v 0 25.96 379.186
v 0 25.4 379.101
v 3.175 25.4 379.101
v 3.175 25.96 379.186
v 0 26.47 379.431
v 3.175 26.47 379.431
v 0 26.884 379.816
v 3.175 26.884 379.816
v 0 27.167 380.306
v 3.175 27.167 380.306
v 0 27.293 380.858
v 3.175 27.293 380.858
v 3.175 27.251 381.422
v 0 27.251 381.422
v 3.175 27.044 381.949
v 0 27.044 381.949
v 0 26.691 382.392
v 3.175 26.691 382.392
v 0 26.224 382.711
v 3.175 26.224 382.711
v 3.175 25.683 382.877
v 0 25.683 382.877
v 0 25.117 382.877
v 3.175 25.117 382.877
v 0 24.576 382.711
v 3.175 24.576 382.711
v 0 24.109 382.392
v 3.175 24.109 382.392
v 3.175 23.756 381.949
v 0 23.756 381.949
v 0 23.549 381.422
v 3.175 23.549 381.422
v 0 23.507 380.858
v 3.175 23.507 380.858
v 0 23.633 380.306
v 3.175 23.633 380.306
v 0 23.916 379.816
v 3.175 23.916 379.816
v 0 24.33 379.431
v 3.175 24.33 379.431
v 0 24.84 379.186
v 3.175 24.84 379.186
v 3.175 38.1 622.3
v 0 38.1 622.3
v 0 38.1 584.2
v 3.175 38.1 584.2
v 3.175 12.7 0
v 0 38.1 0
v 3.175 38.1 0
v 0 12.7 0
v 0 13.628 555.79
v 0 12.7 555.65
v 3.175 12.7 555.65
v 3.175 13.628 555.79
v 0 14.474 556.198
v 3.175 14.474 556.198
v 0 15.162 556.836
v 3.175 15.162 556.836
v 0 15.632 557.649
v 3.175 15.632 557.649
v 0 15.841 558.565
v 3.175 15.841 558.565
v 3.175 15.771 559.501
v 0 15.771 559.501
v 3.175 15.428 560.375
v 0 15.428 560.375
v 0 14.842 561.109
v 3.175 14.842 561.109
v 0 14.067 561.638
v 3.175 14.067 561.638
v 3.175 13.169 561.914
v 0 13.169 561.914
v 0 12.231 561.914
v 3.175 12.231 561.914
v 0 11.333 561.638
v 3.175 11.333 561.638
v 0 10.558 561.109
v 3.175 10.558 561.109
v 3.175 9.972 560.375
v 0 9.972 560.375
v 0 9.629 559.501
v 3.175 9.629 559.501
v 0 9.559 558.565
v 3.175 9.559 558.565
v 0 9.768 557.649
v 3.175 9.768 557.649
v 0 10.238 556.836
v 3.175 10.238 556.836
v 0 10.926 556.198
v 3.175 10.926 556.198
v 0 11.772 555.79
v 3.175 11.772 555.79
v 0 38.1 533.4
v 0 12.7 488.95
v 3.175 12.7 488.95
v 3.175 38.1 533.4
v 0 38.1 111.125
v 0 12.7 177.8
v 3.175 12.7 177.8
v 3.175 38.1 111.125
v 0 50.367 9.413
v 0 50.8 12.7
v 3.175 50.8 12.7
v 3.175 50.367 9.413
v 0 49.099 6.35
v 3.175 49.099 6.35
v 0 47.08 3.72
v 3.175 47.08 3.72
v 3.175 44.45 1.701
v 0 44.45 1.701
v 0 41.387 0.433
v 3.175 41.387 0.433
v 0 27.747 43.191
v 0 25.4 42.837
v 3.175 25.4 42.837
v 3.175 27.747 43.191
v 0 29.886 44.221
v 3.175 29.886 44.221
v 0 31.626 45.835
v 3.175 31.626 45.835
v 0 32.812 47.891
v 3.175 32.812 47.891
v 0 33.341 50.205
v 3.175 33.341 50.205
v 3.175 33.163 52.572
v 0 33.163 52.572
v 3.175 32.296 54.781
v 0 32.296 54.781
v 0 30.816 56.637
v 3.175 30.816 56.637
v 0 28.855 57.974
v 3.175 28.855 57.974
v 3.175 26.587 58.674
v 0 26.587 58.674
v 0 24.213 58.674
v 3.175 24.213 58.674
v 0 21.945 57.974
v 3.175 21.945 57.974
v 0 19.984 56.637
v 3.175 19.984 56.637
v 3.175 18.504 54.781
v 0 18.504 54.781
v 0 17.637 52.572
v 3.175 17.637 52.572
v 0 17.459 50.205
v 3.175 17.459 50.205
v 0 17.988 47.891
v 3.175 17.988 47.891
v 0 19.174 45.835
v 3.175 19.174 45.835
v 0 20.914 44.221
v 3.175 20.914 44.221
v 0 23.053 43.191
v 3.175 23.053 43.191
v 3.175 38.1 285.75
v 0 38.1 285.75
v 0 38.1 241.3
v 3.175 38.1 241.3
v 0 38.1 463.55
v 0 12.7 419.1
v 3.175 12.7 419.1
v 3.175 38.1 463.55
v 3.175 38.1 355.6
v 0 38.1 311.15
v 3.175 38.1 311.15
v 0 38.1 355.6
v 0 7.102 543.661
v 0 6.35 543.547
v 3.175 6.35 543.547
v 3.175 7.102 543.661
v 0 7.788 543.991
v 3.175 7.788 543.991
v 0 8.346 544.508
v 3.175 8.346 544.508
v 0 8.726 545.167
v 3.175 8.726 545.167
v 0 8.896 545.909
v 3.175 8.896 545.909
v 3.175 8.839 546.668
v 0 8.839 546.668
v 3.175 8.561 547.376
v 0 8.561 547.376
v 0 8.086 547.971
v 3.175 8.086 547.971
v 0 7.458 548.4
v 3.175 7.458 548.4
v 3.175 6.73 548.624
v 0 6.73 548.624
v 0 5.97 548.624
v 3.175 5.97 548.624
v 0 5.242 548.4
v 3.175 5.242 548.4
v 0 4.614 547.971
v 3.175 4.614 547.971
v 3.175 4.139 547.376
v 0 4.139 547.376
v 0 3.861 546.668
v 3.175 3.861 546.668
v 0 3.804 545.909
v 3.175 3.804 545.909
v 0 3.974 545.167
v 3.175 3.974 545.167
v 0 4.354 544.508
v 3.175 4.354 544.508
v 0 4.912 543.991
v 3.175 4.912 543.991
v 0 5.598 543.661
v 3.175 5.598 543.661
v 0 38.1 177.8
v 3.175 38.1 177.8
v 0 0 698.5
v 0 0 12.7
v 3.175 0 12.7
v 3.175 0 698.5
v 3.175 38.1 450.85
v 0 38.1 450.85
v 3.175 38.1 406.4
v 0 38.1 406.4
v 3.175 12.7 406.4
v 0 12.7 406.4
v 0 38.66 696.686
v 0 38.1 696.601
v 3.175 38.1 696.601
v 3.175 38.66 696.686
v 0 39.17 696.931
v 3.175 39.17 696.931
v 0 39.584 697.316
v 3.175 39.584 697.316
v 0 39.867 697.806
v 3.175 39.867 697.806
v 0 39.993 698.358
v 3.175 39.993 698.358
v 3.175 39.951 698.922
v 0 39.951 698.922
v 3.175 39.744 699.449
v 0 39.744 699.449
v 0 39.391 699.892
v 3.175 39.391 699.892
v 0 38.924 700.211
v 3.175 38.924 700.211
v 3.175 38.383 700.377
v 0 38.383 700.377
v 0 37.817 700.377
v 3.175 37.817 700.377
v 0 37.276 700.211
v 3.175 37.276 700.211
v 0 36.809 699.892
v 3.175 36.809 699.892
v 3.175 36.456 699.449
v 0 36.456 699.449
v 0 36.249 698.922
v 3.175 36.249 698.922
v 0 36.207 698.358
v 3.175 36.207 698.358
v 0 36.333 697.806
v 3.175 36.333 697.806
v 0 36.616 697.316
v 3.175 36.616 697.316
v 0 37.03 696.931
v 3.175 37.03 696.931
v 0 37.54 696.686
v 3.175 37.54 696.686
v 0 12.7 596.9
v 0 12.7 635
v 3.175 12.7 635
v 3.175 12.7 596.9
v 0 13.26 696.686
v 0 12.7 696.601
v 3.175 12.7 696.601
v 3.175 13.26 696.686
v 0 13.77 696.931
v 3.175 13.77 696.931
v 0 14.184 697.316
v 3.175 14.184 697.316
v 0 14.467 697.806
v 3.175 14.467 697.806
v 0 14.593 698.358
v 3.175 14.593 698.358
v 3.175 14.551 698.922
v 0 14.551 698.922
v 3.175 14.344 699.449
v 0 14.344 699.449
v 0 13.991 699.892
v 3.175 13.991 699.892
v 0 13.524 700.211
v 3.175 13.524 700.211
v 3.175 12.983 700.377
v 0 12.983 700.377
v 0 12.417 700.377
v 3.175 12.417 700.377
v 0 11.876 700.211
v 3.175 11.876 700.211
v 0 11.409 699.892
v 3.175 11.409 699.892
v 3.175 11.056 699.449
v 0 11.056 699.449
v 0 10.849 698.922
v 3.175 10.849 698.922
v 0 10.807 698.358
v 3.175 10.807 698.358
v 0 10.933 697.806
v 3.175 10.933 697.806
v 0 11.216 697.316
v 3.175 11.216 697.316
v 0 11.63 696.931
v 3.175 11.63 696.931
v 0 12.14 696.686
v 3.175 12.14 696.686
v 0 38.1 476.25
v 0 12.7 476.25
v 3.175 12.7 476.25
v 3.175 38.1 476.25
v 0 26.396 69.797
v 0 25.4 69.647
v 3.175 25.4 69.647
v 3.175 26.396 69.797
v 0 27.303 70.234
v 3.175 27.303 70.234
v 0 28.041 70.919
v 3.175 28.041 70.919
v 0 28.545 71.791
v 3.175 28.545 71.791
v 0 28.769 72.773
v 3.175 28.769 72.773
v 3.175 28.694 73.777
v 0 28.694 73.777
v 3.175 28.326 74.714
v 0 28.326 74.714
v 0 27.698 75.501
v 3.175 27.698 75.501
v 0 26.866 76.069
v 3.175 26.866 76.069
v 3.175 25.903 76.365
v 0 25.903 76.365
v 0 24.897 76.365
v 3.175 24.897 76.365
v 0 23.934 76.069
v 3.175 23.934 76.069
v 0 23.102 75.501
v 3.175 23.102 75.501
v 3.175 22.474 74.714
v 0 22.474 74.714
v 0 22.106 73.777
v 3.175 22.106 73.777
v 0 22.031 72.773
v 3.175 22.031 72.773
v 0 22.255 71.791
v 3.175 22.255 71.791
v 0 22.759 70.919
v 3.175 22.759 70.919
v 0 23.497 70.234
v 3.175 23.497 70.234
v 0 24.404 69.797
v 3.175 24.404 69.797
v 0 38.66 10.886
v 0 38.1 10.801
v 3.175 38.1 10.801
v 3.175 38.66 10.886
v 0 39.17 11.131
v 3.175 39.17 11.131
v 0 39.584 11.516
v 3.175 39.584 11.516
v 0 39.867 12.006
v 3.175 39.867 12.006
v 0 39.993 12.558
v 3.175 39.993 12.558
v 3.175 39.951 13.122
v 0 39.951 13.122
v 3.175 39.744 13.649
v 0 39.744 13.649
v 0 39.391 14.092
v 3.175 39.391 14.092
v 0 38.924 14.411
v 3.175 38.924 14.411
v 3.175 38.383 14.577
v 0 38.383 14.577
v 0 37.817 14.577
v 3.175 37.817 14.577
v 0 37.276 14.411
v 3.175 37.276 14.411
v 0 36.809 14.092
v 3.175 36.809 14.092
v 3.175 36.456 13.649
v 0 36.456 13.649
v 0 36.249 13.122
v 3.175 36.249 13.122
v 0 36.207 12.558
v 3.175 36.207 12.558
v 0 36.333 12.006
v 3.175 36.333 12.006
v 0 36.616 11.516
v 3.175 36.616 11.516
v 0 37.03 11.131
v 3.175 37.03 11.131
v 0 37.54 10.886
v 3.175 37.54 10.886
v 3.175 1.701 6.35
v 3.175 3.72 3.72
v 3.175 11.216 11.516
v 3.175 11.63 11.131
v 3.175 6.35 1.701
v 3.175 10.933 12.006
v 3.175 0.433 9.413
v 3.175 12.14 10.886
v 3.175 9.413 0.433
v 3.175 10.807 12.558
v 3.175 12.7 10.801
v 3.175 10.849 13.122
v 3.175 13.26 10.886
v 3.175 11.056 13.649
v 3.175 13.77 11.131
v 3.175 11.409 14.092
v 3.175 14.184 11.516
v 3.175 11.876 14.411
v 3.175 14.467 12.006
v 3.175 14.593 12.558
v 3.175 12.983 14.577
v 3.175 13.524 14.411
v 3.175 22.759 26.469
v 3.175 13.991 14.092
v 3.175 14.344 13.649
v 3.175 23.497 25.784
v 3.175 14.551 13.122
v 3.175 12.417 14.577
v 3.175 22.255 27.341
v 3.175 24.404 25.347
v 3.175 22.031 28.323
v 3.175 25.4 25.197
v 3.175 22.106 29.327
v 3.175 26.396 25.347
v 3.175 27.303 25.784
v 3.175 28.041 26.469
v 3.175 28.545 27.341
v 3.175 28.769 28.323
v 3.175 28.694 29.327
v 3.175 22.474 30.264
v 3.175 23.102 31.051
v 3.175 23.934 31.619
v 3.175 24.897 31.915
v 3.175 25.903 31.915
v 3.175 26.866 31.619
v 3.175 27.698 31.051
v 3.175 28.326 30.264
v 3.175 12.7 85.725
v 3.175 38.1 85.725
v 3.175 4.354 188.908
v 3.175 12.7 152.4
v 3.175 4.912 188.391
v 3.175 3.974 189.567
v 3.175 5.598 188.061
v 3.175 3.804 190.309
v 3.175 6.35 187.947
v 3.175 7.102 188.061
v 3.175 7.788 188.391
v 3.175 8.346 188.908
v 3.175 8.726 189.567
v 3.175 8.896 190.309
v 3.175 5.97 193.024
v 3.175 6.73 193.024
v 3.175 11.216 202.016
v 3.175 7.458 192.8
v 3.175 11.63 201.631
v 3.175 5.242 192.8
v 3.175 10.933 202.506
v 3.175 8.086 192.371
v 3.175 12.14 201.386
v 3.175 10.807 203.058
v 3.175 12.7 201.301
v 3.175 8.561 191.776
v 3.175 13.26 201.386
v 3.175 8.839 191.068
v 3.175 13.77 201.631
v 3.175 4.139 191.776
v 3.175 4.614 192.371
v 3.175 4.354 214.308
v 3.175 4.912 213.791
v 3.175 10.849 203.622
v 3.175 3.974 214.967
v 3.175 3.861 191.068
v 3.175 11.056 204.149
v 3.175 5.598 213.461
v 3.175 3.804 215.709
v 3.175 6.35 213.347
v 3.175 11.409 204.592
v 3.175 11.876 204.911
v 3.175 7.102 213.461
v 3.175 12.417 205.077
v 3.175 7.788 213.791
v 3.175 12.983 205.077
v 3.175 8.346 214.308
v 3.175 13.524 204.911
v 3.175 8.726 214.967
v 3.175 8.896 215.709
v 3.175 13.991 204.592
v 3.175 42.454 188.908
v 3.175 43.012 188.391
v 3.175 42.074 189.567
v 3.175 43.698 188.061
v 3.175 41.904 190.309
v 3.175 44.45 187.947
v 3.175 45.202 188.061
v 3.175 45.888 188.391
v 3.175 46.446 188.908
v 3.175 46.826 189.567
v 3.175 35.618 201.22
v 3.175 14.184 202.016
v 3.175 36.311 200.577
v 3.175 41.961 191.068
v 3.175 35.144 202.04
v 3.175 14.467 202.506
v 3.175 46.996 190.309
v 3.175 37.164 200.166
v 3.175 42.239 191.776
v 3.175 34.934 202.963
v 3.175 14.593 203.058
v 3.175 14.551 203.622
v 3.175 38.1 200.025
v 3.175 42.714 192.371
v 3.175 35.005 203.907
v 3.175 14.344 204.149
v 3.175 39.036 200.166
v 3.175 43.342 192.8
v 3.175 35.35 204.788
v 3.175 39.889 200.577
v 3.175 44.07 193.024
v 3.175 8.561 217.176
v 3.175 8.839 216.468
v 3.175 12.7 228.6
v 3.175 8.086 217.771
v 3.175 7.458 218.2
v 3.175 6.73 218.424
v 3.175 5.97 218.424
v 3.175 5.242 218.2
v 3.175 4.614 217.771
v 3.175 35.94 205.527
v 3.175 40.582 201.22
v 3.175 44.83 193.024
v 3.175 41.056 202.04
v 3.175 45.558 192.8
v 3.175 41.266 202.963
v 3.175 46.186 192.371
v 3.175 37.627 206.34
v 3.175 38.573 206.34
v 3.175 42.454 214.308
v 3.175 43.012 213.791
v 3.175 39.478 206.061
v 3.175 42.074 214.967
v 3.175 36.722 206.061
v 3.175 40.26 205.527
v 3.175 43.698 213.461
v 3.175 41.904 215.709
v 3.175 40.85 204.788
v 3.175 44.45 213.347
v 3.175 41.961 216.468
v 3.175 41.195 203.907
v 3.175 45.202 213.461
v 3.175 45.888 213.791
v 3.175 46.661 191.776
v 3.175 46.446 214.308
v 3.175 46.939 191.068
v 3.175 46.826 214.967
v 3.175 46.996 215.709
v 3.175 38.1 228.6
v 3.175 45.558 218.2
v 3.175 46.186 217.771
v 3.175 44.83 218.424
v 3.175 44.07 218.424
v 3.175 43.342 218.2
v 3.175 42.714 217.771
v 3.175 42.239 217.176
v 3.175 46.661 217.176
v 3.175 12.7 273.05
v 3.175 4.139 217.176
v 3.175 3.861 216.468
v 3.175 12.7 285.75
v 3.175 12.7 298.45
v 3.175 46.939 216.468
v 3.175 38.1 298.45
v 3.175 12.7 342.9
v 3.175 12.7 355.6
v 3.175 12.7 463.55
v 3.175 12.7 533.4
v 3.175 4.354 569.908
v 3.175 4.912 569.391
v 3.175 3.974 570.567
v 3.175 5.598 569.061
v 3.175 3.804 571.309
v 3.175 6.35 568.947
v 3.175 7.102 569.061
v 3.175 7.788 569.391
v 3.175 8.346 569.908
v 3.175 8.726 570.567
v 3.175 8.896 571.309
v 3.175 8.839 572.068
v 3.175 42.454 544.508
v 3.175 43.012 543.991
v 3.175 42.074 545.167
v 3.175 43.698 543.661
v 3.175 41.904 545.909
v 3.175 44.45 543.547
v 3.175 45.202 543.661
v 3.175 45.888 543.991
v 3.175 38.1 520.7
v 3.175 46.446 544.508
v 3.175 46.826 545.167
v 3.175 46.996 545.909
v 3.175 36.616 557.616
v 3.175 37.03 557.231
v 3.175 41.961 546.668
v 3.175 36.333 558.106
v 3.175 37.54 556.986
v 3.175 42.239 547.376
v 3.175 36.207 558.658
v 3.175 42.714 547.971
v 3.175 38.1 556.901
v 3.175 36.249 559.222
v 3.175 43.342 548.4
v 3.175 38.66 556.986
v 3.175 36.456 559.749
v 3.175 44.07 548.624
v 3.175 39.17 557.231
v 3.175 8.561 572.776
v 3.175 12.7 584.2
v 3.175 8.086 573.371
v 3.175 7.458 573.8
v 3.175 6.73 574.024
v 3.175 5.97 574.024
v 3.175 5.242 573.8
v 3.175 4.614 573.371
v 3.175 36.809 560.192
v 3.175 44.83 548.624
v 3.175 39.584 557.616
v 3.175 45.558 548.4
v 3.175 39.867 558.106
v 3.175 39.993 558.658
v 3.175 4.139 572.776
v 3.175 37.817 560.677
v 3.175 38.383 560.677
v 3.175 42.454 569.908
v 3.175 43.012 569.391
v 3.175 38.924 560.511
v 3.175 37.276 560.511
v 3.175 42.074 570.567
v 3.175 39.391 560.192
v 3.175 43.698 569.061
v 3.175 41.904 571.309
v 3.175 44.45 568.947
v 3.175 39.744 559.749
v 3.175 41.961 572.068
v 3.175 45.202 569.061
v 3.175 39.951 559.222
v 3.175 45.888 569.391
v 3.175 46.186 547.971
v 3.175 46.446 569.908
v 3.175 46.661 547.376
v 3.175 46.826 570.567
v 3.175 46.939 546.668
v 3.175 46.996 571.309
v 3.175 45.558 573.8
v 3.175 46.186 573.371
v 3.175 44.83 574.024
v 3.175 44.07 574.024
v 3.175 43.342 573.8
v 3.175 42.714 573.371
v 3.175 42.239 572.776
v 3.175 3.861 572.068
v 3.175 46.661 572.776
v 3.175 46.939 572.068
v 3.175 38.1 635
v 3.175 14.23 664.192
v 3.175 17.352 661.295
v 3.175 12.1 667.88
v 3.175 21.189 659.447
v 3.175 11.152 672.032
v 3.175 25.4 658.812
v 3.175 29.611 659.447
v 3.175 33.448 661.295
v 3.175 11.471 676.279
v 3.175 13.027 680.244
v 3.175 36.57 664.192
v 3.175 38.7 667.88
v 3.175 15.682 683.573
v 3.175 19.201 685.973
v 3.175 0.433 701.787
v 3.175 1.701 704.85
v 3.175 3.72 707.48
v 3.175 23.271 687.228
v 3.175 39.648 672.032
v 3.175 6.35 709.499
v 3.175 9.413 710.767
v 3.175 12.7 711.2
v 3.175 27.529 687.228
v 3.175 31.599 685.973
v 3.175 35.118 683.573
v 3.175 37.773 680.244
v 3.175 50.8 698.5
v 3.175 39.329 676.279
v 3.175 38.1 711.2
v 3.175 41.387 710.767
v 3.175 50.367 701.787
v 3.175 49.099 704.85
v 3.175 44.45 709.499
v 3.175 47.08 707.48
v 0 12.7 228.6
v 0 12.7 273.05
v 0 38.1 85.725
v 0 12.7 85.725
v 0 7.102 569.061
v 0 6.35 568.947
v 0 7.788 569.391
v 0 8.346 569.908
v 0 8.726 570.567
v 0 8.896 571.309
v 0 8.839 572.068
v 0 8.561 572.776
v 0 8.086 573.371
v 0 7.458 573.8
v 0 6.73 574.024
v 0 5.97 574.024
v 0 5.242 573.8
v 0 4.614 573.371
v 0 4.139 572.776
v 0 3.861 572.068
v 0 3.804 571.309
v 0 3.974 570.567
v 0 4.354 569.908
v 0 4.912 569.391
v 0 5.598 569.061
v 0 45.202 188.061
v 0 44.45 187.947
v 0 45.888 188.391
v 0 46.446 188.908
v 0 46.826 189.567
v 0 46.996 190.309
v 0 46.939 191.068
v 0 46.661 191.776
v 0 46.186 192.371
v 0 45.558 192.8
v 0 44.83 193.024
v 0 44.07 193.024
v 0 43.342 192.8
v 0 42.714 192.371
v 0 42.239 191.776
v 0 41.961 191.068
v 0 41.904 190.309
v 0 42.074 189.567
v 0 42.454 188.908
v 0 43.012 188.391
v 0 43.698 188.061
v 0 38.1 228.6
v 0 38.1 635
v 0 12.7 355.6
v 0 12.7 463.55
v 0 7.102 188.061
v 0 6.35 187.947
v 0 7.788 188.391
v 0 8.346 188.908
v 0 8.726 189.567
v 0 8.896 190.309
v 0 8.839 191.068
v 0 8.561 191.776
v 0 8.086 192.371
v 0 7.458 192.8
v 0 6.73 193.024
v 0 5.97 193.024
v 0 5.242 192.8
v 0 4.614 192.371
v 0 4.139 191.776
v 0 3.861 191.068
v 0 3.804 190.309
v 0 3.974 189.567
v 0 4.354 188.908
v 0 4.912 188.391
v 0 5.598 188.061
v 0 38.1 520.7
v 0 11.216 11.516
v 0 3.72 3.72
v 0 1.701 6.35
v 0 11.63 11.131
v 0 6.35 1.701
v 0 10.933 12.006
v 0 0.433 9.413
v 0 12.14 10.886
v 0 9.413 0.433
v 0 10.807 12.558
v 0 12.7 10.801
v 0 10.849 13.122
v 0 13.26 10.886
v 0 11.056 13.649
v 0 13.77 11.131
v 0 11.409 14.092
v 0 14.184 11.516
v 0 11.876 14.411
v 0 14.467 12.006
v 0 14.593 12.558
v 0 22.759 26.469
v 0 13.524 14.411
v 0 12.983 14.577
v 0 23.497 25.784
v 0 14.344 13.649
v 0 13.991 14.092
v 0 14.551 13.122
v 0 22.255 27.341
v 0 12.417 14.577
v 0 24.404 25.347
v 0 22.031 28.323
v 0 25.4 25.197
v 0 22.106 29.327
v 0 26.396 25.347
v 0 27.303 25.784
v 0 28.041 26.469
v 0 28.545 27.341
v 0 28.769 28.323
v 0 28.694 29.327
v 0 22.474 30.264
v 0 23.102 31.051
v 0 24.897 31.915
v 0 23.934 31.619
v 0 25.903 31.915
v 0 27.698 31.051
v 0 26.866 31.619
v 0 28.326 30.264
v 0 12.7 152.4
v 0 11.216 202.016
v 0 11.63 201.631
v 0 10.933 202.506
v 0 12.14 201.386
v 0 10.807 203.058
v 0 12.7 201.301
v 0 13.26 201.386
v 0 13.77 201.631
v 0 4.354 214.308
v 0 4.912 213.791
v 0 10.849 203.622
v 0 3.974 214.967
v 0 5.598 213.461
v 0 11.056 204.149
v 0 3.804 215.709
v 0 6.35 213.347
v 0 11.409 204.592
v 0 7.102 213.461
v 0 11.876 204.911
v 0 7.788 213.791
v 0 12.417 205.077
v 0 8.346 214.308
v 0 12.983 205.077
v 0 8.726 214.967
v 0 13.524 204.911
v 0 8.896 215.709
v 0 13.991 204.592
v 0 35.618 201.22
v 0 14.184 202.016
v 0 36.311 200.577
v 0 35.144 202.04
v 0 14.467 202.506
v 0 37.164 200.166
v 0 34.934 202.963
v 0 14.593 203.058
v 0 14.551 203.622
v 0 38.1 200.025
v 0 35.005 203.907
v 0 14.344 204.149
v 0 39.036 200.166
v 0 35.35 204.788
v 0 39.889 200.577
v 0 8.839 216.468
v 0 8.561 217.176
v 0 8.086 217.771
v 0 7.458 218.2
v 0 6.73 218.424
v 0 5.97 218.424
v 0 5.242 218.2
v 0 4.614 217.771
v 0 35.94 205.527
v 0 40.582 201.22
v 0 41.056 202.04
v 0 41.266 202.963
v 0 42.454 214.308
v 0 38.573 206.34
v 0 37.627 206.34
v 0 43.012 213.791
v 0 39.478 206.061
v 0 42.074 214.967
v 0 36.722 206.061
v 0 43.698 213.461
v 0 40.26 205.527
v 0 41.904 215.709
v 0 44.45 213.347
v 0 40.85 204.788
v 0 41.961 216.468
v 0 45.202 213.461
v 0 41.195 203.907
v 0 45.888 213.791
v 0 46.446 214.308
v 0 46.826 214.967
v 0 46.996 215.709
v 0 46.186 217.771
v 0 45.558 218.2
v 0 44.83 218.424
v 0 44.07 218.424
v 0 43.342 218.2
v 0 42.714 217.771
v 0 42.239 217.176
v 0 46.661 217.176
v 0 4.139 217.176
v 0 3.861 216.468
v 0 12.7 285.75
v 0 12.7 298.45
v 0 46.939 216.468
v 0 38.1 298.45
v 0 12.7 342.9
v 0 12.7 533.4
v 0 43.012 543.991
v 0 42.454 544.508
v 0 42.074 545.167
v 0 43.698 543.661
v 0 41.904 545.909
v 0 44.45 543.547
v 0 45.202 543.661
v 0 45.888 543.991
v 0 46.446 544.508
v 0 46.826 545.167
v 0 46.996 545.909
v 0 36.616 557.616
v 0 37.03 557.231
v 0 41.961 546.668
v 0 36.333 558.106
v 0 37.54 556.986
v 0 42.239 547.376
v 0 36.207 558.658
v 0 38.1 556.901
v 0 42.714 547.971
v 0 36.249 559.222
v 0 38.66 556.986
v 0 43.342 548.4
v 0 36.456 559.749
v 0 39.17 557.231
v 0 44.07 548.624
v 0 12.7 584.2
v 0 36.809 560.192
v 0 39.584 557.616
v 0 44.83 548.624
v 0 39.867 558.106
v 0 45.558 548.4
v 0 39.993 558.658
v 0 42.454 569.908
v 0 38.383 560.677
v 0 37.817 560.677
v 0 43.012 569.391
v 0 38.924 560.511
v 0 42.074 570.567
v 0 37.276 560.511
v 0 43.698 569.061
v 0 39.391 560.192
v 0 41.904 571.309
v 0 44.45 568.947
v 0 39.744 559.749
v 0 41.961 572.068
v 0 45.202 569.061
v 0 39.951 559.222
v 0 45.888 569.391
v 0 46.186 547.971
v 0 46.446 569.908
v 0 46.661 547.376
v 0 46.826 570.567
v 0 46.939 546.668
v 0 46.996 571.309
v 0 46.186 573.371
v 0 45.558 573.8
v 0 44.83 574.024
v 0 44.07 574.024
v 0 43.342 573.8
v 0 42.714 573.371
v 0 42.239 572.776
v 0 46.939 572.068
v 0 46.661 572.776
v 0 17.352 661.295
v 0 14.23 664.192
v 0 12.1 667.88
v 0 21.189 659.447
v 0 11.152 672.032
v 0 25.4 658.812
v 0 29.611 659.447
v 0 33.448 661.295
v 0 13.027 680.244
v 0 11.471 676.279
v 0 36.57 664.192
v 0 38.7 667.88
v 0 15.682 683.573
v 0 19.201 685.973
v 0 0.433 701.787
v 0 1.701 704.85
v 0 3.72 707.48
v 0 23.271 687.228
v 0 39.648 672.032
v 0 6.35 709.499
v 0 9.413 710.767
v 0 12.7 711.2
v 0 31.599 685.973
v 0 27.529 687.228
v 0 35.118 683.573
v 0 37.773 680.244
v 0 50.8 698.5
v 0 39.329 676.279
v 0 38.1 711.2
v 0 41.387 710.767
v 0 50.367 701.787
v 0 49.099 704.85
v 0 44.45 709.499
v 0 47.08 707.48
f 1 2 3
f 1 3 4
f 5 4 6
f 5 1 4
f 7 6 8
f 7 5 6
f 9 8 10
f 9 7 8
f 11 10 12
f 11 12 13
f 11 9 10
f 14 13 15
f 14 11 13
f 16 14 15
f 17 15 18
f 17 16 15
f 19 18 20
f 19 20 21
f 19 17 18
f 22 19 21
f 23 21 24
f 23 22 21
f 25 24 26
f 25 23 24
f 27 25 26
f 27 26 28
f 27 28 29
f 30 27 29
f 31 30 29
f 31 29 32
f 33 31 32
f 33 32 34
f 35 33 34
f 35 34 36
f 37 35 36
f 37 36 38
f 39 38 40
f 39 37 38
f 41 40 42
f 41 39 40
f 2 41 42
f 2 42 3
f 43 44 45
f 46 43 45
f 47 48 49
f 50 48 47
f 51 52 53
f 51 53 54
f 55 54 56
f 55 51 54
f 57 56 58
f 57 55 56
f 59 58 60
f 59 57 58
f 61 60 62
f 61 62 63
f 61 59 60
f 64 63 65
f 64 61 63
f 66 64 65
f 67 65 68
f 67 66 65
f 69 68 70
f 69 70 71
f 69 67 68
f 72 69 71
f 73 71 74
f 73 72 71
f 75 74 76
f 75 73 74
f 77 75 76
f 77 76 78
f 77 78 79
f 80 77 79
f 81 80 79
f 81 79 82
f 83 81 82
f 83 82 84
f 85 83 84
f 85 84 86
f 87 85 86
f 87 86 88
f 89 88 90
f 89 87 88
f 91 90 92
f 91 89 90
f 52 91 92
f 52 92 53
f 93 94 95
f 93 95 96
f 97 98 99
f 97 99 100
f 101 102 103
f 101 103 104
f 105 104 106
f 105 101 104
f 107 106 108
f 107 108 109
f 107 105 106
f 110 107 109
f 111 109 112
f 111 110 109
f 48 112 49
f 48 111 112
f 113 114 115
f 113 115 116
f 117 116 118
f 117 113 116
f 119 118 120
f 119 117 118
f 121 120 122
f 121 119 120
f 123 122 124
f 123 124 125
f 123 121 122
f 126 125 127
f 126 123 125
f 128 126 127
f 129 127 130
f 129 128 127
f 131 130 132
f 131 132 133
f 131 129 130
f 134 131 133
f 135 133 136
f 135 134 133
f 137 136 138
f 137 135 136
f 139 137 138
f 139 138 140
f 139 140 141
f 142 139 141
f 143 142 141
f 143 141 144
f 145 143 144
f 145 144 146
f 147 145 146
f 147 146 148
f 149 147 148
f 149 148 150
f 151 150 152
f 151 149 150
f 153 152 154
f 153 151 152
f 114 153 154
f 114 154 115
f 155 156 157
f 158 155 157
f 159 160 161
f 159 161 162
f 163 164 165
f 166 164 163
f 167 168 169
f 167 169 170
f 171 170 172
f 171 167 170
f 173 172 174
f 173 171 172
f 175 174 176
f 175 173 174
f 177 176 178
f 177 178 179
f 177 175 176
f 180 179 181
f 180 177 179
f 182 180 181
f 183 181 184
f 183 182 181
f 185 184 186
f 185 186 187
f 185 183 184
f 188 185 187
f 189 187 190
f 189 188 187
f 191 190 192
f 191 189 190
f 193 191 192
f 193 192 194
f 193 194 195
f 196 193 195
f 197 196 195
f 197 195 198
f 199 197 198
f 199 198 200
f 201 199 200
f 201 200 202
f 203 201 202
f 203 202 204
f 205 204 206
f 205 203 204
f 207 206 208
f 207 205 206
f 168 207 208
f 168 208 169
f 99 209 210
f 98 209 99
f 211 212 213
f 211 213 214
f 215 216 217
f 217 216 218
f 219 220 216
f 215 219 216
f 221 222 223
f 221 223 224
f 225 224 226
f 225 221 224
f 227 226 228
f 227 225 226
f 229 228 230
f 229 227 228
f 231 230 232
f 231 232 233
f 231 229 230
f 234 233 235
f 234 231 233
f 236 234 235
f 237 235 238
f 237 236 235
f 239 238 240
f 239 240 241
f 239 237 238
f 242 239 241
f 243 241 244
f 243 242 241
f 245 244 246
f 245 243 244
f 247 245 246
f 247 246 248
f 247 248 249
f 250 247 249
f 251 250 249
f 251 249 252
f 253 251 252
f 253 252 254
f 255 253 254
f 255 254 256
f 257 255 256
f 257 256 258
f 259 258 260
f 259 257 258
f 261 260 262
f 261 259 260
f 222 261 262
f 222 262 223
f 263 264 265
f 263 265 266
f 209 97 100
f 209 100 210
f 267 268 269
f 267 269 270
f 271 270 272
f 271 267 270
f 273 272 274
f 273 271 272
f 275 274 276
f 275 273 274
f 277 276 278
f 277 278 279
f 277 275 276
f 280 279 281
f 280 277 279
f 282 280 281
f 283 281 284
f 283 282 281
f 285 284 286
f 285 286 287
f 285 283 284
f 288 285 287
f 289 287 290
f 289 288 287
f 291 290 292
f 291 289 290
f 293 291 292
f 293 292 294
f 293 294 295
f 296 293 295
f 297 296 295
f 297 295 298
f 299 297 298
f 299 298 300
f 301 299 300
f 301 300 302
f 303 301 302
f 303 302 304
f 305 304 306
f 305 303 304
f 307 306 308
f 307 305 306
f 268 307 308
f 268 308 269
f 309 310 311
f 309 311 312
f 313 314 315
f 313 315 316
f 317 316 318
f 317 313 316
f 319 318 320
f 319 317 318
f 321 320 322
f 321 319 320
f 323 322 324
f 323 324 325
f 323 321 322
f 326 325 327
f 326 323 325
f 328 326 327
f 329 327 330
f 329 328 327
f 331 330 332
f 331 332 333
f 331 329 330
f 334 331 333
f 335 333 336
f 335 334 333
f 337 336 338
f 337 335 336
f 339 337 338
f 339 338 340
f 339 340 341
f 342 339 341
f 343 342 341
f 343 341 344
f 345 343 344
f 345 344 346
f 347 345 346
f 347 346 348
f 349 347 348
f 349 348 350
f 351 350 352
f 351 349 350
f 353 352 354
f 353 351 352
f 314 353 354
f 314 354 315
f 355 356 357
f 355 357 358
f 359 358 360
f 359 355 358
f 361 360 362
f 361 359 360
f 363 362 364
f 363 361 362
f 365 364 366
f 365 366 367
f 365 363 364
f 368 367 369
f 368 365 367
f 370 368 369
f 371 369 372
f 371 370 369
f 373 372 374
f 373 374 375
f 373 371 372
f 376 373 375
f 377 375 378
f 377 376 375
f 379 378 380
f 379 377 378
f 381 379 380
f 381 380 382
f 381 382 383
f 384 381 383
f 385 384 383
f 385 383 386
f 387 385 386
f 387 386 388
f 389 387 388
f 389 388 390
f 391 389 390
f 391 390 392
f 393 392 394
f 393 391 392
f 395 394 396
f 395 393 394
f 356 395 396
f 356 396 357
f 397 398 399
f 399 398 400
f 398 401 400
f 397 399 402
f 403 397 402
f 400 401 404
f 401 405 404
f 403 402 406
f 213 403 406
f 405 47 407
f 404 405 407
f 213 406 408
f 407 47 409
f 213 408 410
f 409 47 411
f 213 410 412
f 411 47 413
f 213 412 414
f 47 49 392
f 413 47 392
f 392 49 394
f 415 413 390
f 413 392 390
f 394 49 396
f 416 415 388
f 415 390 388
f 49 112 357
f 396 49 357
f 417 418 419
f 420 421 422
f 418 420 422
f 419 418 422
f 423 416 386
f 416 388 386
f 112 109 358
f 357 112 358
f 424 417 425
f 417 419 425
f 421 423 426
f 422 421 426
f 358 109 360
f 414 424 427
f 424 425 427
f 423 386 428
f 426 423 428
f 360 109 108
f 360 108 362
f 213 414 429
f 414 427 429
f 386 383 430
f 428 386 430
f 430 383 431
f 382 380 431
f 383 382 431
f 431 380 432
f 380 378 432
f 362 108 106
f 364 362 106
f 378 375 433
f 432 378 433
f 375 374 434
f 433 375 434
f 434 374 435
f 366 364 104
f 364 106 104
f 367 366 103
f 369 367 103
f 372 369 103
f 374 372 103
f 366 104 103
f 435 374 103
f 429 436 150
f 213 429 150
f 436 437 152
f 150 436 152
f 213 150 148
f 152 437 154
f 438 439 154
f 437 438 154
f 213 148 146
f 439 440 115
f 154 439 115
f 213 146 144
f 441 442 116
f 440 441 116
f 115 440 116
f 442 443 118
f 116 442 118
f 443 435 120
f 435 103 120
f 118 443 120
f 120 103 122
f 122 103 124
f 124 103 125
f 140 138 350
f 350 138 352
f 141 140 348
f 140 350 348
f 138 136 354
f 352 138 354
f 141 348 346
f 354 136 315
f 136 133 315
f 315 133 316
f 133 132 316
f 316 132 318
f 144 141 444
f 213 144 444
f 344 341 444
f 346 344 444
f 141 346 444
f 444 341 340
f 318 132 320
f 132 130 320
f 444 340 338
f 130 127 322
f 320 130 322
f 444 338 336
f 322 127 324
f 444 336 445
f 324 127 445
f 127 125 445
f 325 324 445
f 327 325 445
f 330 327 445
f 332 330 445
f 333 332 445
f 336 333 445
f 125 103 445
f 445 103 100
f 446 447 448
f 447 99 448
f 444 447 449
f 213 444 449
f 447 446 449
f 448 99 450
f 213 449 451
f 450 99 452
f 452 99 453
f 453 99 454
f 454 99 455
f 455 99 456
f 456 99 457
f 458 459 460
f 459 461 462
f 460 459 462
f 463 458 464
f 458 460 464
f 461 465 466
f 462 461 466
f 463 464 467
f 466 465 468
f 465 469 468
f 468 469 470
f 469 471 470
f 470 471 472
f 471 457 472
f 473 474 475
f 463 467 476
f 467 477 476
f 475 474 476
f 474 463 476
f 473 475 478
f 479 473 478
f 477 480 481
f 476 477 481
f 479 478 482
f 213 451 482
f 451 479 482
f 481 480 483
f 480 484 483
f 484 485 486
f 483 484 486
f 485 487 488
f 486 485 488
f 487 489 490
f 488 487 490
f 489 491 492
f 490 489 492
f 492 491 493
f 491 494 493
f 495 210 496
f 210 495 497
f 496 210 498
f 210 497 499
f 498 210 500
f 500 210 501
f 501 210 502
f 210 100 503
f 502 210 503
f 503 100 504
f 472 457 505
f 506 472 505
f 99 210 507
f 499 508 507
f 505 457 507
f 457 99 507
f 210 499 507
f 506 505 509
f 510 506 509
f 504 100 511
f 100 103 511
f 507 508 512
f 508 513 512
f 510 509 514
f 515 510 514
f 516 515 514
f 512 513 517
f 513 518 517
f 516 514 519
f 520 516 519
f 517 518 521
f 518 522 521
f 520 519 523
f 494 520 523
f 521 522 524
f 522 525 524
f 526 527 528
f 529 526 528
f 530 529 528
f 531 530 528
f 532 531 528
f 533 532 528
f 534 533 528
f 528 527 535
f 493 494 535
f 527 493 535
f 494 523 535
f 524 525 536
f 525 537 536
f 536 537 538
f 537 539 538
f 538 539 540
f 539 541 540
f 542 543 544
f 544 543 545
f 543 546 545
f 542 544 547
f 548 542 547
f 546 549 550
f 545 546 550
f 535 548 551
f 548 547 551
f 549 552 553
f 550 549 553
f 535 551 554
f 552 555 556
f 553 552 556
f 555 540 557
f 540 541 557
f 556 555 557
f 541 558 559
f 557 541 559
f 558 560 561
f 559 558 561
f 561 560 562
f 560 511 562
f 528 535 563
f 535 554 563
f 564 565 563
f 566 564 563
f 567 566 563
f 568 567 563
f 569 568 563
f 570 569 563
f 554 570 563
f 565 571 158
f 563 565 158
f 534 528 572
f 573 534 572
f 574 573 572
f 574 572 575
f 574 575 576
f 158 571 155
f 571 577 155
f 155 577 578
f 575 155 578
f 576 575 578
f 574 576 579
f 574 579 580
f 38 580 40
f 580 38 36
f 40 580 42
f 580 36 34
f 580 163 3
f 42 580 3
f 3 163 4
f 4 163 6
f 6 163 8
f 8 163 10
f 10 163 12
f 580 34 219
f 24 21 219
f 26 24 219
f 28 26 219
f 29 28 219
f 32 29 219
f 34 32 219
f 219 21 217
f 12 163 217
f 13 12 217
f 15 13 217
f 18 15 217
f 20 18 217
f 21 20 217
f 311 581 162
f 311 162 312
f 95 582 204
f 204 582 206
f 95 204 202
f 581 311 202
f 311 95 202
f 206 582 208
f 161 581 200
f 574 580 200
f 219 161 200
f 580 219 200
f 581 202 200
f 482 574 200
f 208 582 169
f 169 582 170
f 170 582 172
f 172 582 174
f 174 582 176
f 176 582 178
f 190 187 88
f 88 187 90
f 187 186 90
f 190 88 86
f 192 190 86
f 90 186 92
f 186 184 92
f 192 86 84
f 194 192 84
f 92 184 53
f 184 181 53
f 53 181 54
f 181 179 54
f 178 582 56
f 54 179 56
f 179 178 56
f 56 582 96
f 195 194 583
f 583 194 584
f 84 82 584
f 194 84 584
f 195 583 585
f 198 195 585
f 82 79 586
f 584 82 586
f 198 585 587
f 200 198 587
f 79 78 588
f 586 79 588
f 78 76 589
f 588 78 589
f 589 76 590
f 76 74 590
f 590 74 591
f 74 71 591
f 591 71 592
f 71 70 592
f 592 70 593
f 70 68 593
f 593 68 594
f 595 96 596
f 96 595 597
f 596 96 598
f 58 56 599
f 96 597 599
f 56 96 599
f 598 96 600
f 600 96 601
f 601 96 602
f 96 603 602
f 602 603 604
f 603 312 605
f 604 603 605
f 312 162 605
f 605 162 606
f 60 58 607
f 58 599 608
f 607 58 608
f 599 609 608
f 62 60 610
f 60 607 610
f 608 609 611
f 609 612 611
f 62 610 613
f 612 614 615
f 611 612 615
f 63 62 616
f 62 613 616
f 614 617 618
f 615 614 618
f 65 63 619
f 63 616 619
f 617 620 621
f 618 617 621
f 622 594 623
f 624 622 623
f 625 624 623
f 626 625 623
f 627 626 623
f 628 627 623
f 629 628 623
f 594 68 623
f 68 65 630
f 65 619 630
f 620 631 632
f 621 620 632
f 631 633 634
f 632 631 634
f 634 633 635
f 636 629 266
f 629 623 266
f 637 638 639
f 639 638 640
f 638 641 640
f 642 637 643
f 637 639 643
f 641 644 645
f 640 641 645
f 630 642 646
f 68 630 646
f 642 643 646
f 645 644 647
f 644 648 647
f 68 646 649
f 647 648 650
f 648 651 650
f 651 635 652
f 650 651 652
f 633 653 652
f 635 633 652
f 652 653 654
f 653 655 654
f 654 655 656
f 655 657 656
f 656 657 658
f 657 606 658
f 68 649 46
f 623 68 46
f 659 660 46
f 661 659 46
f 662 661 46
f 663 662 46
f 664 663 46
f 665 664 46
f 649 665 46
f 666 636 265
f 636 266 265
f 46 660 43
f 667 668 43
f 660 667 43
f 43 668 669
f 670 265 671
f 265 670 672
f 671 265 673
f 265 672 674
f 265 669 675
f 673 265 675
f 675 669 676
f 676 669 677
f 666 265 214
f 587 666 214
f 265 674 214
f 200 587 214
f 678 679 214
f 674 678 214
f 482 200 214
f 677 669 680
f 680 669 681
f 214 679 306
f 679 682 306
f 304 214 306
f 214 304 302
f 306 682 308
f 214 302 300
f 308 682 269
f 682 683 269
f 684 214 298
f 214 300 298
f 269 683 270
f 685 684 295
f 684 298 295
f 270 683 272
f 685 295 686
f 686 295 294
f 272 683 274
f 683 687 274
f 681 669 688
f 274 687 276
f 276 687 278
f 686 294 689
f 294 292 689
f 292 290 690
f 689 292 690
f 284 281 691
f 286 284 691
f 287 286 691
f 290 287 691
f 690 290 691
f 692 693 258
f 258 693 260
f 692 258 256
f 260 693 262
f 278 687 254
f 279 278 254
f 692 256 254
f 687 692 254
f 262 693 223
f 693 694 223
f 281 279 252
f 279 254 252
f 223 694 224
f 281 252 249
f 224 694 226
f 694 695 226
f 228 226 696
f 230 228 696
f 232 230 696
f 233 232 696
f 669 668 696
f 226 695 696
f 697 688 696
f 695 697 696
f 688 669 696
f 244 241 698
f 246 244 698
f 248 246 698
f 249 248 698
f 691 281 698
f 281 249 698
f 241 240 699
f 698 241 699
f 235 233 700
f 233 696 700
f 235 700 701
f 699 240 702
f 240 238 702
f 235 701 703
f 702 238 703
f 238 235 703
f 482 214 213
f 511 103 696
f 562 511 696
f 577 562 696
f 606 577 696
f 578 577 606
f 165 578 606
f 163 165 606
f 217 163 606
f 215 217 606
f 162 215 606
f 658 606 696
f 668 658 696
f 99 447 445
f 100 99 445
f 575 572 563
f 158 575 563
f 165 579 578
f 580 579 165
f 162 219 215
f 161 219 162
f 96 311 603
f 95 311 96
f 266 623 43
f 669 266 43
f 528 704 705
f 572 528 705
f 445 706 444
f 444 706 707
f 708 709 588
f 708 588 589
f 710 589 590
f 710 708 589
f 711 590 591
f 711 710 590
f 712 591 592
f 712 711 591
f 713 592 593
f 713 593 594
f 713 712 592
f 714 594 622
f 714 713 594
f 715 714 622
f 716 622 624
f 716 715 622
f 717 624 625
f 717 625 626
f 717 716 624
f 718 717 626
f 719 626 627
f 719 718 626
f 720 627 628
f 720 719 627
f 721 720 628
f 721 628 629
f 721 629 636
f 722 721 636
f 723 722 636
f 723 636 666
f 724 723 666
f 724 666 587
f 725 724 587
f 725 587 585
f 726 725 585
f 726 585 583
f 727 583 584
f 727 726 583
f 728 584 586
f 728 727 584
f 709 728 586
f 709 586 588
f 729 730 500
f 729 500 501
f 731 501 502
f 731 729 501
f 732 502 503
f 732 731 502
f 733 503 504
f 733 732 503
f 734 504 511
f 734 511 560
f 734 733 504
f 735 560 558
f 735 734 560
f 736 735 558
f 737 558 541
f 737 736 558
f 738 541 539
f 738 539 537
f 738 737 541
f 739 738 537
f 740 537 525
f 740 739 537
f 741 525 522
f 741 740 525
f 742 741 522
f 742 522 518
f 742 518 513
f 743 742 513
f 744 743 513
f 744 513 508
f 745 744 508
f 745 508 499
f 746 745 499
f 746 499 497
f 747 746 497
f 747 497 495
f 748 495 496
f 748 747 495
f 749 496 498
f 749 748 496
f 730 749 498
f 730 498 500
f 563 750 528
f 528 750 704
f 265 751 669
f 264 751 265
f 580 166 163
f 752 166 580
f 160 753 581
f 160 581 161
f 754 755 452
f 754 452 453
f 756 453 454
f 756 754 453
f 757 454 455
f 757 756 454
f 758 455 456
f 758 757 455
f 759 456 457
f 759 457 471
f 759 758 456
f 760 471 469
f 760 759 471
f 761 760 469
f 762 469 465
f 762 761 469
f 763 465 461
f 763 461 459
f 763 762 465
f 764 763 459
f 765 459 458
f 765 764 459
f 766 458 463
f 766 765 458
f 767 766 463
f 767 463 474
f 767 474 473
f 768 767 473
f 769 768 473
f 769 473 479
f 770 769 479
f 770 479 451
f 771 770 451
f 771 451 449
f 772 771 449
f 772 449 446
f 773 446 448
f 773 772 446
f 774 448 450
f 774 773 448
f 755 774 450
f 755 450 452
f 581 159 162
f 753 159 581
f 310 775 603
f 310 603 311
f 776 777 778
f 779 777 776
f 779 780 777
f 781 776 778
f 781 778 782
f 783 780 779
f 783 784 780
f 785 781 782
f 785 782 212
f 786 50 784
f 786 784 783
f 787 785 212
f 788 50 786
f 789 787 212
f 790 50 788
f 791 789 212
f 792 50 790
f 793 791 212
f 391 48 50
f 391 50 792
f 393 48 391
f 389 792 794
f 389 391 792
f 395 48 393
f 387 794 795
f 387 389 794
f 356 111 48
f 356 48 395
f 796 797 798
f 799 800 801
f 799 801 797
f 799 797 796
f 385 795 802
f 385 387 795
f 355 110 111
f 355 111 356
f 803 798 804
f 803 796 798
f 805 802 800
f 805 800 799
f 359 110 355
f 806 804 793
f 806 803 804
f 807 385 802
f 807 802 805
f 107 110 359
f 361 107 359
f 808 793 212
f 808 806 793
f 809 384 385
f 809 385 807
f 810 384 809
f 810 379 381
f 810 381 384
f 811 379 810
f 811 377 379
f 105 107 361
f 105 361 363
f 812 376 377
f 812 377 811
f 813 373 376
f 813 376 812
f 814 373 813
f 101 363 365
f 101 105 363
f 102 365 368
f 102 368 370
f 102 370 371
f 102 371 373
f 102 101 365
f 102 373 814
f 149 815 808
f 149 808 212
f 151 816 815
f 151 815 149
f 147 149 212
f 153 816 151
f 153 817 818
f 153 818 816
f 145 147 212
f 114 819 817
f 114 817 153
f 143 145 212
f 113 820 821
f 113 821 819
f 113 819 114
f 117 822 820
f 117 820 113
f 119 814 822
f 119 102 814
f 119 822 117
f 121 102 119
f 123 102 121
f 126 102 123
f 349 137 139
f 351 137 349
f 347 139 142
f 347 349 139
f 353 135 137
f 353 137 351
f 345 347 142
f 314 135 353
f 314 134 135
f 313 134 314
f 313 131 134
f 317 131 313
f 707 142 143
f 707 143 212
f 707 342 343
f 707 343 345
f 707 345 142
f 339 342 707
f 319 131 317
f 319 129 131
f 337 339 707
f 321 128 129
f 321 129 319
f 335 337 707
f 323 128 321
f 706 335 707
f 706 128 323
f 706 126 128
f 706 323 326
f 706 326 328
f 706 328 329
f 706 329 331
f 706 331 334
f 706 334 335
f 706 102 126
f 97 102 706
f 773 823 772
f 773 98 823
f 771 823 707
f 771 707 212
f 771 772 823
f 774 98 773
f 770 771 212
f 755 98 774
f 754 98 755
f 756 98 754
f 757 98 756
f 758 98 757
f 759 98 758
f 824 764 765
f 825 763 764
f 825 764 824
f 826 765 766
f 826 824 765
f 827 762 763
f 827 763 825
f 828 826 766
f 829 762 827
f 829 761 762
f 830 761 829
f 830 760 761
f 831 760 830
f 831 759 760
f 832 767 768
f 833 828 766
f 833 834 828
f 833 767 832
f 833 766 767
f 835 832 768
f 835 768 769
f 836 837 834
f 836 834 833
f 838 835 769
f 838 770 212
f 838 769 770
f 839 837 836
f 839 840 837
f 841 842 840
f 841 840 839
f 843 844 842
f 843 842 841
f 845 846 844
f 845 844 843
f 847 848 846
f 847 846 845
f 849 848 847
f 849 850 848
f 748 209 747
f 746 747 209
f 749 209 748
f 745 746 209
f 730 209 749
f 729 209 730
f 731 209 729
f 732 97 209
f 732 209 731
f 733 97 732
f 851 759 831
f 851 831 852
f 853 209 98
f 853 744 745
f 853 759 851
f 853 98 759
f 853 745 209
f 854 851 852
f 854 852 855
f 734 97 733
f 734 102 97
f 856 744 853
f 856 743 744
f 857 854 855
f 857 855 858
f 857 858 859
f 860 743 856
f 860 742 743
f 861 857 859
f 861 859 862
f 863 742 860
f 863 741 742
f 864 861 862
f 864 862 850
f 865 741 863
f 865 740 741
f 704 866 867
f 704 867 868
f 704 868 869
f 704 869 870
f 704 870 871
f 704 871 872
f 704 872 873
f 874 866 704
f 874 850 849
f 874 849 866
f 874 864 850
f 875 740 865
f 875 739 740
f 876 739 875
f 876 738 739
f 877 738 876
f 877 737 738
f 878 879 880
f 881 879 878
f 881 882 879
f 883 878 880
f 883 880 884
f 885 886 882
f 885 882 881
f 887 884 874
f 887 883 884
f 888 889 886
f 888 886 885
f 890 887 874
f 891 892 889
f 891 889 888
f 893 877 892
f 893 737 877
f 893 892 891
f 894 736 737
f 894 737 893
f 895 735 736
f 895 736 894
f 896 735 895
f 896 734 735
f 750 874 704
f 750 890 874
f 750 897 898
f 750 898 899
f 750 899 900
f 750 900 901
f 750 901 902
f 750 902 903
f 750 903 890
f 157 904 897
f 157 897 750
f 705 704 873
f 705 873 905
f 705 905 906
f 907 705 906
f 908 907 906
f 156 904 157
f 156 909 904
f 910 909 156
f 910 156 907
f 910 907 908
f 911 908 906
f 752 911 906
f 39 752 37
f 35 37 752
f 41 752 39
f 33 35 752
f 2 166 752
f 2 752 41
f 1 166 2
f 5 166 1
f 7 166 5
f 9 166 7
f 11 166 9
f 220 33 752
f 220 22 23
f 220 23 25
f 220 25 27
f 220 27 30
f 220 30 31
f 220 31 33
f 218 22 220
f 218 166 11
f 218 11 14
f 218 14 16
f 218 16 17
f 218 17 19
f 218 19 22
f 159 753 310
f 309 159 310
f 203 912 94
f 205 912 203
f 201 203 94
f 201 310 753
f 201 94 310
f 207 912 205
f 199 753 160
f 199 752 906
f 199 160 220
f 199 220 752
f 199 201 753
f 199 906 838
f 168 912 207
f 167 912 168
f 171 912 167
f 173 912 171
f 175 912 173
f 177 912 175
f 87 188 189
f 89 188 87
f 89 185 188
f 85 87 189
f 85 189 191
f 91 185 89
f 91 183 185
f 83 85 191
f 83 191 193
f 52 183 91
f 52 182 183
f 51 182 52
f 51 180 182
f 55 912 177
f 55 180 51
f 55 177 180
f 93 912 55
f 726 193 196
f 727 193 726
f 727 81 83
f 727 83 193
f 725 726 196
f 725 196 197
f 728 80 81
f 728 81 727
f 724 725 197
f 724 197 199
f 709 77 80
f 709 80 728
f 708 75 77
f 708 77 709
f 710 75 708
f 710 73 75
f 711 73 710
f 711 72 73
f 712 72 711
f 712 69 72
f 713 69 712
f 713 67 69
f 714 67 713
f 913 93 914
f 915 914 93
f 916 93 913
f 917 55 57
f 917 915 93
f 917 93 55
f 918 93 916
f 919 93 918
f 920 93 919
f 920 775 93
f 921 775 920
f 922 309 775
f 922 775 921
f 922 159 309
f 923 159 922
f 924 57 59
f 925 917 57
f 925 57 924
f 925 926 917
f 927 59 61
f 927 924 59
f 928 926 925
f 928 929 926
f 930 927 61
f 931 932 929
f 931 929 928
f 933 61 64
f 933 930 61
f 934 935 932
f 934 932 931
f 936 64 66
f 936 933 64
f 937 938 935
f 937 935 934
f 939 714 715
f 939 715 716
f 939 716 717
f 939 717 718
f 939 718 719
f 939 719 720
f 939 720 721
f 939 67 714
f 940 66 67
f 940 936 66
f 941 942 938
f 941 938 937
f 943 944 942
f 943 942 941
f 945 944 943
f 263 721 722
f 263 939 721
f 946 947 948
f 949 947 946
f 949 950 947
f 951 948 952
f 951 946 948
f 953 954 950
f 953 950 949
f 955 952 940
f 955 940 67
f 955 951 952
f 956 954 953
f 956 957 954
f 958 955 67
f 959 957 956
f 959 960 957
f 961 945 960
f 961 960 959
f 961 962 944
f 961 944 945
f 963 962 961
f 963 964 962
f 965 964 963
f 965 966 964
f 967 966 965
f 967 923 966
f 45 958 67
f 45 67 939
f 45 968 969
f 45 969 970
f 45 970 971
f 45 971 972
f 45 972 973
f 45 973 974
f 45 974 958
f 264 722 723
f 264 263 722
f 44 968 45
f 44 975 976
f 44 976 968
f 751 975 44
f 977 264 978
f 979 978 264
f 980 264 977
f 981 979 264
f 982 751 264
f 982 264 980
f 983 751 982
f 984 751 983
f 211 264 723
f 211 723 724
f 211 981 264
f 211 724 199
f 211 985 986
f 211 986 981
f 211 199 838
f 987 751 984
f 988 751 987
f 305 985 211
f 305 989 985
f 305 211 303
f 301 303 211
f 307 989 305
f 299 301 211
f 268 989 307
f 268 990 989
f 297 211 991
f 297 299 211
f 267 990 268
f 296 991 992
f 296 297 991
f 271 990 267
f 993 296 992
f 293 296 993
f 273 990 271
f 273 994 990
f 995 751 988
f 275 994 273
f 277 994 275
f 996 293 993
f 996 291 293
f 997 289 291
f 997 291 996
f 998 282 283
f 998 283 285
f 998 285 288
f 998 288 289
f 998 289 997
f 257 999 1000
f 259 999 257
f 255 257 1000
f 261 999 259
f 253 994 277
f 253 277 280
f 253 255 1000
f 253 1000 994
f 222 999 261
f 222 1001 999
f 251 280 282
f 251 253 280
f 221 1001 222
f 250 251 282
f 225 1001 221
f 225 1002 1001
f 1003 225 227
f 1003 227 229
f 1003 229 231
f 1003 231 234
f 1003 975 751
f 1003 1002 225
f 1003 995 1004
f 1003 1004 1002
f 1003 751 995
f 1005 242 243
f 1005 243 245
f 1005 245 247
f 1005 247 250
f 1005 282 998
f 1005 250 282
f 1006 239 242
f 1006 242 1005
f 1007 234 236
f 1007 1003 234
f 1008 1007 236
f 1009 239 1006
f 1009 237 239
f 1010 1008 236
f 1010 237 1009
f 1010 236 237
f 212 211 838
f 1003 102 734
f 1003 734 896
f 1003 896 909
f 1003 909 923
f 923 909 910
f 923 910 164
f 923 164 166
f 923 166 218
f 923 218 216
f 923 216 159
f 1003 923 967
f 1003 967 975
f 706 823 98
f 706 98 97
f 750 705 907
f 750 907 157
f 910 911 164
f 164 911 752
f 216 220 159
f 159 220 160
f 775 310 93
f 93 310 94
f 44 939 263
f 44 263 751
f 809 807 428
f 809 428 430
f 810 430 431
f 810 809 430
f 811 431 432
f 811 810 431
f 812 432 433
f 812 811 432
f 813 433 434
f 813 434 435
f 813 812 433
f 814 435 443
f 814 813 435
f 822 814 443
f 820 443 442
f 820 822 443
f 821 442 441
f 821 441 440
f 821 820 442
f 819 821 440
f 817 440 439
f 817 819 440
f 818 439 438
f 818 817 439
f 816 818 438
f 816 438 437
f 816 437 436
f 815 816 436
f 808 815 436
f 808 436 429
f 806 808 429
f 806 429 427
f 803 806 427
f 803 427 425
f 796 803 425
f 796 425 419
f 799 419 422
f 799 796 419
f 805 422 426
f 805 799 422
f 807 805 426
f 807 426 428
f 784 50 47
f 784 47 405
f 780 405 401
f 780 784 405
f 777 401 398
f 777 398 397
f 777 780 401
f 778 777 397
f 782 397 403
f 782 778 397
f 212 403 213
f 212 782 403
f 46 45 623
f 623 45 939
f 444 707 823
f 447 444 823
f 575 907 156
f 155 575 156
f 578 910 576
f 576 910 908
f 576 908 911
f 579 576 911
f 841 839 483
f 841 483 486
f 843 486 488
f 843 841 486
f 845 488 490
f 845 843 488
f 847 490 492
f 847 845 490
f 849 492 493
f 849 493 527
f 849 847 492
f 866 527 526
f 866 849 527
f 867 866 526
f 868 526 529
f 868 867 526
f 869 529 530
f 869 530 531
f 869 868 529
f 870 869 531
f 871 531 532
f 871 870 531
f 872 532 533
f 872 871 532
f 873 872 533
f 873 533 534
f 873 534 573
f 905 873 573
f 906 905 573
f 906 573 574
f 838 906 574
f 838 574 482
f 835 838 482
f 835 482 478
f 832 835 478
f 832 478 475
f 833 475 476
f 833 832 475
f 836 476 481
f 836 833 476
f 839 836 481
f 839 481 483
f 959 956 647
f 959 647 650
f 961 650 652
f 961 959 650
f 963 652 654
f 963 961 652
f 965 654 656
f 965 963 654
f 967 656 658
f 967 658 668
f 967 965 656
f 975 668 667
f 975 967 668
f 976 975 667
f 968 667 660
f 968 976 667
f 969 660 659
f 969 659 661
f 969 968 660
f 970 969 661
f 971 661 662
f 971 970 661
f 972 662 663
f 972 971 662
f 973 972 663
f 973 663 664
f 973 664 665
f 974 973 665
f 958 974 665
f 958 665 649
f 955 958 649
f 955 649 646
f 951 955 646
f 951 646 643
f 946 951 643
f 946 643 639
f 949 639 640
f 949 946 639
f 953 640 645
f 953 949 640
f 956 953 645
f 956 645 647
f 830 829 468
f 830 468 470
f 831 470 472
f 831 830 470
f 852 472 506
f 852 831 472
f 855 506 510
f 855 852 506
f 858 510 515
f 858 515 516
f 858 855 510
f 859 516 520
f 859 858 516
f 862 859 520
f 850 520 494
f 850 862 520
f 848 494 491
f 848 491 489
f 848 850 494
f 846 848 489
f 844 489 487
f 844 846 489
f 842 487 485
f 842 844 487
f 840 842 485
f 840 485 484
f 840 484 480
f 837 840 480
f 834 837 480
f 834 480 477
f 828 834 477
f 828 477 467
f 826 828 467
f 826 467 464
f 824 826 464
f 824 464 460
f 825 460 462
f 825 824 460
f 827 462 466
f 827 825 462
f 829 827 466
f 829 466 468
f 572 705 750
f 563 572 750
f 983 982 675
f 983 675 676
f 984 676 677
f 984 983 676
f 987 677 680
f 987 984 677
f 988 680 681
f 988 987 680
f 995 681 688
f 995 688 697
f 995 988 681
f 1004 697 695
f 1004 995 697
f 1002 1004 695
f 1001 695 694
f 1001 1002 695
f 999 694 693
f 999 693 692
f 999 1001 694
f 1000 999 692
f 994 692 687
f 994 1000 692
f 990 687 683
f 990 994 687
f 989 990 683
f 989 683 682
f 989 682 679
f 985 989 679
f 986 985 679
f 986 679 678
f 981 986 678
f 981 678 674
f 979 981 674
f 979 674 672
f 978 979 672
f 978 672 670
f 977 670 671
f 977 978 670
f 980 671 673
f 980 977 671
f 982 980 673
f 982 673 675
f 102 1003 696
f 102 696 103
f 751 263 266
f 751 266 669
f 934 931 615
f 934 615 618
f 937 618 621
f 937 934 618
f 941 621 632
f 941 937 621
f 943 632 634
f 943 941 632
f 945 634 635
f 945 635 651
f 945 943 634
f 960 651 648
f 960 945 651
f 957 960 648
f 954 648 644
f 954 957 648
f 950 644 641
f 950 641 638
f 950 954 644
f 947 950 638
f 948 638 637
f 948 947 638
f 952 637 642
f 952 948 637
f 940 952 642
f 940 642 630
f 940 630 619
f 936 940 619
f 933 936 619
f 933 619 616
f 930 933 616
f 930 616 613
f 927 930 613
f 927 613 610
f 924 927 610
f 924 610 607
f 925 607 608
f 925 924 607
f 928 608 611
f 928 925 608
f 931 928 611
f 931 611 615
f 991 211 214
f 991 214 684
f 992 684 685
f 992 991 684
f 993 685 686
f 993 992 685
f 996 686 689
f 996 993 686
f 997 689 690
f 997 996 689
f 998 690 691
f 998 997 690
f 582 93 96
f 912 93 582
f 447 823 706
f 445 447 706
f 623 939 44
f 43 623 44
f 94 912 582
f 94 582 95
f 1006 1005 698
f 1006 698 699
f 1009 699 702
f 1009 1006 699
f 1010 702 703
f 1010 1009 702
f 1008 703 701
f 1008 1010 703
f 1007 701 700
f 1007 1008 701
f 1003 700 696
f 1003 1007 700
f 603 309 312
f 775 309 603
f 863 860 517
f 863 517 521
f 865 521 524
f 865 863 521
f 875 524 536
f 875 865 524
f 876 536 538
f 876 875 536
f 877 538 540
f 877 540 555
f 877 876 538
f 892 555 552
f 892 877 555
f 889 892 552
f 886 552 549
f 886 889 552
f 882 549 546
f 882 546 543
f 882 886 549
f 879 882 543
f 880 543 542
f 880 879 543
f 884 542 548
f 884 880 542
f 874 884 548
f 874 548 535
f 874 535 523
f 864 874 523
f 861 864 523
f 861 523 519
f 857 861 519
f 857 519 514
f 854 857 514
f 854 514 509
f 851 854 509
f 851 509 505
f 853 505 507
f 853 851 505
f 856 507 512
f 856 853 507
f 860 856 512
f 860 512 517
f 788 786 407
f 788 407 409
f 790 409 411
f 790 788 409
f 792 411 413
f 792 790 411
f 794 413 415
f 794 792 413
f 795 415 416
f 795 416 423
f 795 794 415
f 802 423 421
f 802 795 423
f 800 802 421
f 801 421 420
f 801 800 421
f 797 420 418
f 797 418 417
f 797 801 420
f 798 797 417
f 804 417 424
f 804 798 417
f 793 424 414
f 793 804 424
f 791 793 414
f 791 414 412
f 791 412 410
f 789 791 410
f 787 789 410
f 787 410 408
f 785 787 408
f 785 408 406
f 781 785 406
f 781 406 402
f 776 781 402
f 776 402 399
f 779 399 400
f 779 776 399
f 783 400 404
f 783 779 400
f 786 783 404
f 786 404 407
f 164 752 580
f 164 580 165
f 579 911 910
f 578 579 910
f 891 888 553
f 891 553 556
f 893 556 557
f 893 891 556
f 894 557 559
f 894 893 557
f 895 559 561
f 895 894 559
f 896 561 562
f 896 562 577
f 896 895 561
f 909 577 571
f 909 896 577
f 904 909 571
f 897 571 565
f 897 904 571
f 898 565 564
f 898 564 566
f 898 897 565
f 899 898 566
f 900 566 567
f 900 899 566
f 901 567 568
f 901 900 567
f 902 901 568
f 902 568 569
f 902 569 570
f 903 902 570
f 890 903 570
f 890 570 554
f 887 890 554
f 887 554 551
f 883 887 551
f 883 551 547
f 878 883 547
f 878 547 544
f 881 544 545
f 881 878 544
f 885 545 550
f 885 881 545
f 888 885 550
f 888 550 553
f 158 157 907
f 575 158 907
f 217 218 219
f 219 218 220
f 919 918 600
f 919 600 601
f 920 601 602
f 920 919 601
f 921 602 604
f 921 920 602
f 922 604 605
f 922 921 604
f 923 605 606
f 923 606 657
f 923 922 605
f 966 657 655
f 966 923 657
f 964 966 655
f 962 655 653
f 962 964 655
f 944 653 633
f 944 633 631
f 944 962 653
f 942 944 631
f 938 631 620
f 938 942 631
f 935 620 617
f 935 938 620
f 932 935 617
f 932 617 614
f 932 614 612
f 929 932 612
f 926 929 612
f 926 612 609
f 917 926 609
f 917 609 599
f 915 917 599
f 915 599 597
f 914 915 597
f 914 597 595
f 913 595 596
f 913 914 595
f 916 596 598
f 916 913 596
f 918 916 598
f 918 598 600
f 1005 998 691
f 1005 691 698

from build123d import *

# Parameters (mm, degrees)
SKETCH1_R           = 7.9629
SKETCH1_R_2         = 3.3782
SKETCH1_R_3         = 2.5527
SKETCH1_R_4         = 14.2875
SKETCH1_R_5         = 1.89865
SKETCH1_R_6         = 3.1496
SKETCH1_R_7         = 3.175
BOSS_EXTRUDE1_DEPTH = 3.175


with BuildPart() as part:
    # Sketch1 → Boss-Extrude1 (new body)
    with BuildSketch(Plane(origin=(0, 0, 0), x_dir=(0, 0, -1), z_dir=(1, 0, 0))):
        with BuildLine():
            Line((-12.7, 0), (-698.5, 0))
            ThreePointArc((-698.5, 0), (-707.480256121, 3.719743879), (-711.2, 12.7))
            Line((-711.2, 12.7), (-711.2, 38.1))
            ThreePointArc((-711.2, 38.1), (-707.480256121, 47.080256121), (-698.5, 50.8))
            Line((-698.5, 50.8), (-12.7, 50.8))
            ThreePointArc((-12.7, 50.8), (-3.719743879, 47.080256121), (0, 38.1))
            Line((0, 38.1), (0, 12.7))
            ThreePointArc((0, 12.7), (-3.719743879, 3.719743879), (-12.7, 0))
        make_face()
        with Locations((-50.8, 25.4)):
            Circle(SKETCH1_R, mode=Mode.SUBTRACT)
        with Locations((-28.575, 25.4)):
            Circle(SKETCH1_R_2, mode=Mode.SUBTRACT)
        with Locations((-215.9, 44.45)):
            Circle(SKETCH1_R_3, mode=Mode.SUBTRACT)
        with Locations((-190.5, 44.45)):
            Circle(SKETCH1_R_3, mode=Mode.SUBTRACT)
        with Locations((-190.5, 6.35)):
            Circle(SKETCH1_R_3, mode=Mode.SUBTRACT)
        with Locations((-215.9, 6.35)):
            Circle(SKETCH1_R_3, mode=Mode.SUBTRACT)
        with Locations((-73.025, 25.4)):
            Circle(SKETCH1_R_2, mode=Mode.SUBTRACT)
        with Locations((-673.1, 25.4)):
            Circle(SKETCH1_R_4, mode=Mode.SUBTRACT)
        with Locations((-571.5, 44.45)):
            Circle(SKETCH1_R_3, mode=Mode.SUBTRACT)
        with Locations((-546.1, 44.45)):
            Circle(SKETCH1_R_3, mode=Mode.SUBTRACT)
        with Locations((-12.7, 38.1)):
            Circle(SKETCH1_R_5, mode=Mode.SUBTRACT)
        with Locations((-12.7, 12.7)):
            Circle(SKETCH1_R_5, mode=Mode.SUBTRACT)
        with Locations((-546.1, 6.35)):
            Circle(SKETCH1_R_3, mode=Mode.SUBTRACT)
        with Locations((-571.5, 6.35)):
            Circle(SKETCH1_R_3, mode=Mode.SUBTRACT)
        with Locations((-558.8, 12.7)):
            Circle(SKETCH1_R_6, mode=Mode.SUBTRACT)
        with Locations((-203.2, 38.1)):
            Circle(SKETCH1_R_7, mode=Mode.SUBTRACT)
        with Locations((-698.5, 38.1)):
            Circle(SKETCH1_R_5, mode=Mode.SUBTRACT)
        with Locations((-698.5, 12.7)):
            Circle(SKETCH1_R_5, mode=Mode.SUBTRACT)
        with Locations((-558.8, 38.1)):
            Circle(SKETCH1_R_5, mode=Mode.SUBTRACT)
        with Locations((-203.2, 12.7)):
            Circle(SKETCH1_R_5, mode=Mode.SUBTRACT)
        with Locations((-381, 25.4)):
            Circle(SKETCH1_R_5, mode=Mode.SUBTRACT)
        Polygon((-228.6, 38.1), (-228.6, 12.7), (-273.05, 12.7), align=None, mode=Mode.SUBTRACT)
        Polygon((-635, 38.1), (-635, 12.7), (-596.9, 12.7), align=None, mode=Mode.SUBTRACT)
        Polygon((-622.3, 38.1), (-584.2, 38.1), (-584.2, 12.7), align=None, mode=Mode.SUBTRACT)
        Polygon((-533.4, 38.1), (-533.4, 12.7), (-488.95, 12.7), align=None, mode=Mode.SUBTRACT)
        Polygon((-406.4, 38.1), (-406.4, 12.7), (-450.85, 38.1), align=None, mode=Mode.SUBTRACT)
        Polygon((-419.1, 12.7), (-463.55, 38.1), (-463.55, 12.7), align=None, mode=Mode.SUBTRACT)
        Polygon((-476.25, 12.7), (-476.25, 38.1), (-520.7, 38.1), align=None, mode=Mode.SUBTRACT)
        Polygon((-241.3, 38.1), (-285.75, 12.7), (-285.75, 38.1), align=None, mode=Mode.SUBTRACT)
        Polygon((-298.45, 38.1), (-298.45, 12.7), (-342.9, 12.7), align=None, mode=Mode.SUBTRACT)
        Polygon((-355.6, 38.1), (-355.6, 12.7), (-311.15, 38.1), align=None, mode=Mode.SUBTRACT)
        Polygon((-177.8, 38.1), (-177.8, 12.7), (-111.125, 38.1), align=None, mode=Mode.SUBTRACT)
        Polygon((-85.725, 38.1), (-85.725, 12.7), (-152.4, 12.7), align=None, mode=Mode.SUBTRACT)
    extrude(amount=BOSS_EXTRUDE1_DEPTH)


solid = part.part
